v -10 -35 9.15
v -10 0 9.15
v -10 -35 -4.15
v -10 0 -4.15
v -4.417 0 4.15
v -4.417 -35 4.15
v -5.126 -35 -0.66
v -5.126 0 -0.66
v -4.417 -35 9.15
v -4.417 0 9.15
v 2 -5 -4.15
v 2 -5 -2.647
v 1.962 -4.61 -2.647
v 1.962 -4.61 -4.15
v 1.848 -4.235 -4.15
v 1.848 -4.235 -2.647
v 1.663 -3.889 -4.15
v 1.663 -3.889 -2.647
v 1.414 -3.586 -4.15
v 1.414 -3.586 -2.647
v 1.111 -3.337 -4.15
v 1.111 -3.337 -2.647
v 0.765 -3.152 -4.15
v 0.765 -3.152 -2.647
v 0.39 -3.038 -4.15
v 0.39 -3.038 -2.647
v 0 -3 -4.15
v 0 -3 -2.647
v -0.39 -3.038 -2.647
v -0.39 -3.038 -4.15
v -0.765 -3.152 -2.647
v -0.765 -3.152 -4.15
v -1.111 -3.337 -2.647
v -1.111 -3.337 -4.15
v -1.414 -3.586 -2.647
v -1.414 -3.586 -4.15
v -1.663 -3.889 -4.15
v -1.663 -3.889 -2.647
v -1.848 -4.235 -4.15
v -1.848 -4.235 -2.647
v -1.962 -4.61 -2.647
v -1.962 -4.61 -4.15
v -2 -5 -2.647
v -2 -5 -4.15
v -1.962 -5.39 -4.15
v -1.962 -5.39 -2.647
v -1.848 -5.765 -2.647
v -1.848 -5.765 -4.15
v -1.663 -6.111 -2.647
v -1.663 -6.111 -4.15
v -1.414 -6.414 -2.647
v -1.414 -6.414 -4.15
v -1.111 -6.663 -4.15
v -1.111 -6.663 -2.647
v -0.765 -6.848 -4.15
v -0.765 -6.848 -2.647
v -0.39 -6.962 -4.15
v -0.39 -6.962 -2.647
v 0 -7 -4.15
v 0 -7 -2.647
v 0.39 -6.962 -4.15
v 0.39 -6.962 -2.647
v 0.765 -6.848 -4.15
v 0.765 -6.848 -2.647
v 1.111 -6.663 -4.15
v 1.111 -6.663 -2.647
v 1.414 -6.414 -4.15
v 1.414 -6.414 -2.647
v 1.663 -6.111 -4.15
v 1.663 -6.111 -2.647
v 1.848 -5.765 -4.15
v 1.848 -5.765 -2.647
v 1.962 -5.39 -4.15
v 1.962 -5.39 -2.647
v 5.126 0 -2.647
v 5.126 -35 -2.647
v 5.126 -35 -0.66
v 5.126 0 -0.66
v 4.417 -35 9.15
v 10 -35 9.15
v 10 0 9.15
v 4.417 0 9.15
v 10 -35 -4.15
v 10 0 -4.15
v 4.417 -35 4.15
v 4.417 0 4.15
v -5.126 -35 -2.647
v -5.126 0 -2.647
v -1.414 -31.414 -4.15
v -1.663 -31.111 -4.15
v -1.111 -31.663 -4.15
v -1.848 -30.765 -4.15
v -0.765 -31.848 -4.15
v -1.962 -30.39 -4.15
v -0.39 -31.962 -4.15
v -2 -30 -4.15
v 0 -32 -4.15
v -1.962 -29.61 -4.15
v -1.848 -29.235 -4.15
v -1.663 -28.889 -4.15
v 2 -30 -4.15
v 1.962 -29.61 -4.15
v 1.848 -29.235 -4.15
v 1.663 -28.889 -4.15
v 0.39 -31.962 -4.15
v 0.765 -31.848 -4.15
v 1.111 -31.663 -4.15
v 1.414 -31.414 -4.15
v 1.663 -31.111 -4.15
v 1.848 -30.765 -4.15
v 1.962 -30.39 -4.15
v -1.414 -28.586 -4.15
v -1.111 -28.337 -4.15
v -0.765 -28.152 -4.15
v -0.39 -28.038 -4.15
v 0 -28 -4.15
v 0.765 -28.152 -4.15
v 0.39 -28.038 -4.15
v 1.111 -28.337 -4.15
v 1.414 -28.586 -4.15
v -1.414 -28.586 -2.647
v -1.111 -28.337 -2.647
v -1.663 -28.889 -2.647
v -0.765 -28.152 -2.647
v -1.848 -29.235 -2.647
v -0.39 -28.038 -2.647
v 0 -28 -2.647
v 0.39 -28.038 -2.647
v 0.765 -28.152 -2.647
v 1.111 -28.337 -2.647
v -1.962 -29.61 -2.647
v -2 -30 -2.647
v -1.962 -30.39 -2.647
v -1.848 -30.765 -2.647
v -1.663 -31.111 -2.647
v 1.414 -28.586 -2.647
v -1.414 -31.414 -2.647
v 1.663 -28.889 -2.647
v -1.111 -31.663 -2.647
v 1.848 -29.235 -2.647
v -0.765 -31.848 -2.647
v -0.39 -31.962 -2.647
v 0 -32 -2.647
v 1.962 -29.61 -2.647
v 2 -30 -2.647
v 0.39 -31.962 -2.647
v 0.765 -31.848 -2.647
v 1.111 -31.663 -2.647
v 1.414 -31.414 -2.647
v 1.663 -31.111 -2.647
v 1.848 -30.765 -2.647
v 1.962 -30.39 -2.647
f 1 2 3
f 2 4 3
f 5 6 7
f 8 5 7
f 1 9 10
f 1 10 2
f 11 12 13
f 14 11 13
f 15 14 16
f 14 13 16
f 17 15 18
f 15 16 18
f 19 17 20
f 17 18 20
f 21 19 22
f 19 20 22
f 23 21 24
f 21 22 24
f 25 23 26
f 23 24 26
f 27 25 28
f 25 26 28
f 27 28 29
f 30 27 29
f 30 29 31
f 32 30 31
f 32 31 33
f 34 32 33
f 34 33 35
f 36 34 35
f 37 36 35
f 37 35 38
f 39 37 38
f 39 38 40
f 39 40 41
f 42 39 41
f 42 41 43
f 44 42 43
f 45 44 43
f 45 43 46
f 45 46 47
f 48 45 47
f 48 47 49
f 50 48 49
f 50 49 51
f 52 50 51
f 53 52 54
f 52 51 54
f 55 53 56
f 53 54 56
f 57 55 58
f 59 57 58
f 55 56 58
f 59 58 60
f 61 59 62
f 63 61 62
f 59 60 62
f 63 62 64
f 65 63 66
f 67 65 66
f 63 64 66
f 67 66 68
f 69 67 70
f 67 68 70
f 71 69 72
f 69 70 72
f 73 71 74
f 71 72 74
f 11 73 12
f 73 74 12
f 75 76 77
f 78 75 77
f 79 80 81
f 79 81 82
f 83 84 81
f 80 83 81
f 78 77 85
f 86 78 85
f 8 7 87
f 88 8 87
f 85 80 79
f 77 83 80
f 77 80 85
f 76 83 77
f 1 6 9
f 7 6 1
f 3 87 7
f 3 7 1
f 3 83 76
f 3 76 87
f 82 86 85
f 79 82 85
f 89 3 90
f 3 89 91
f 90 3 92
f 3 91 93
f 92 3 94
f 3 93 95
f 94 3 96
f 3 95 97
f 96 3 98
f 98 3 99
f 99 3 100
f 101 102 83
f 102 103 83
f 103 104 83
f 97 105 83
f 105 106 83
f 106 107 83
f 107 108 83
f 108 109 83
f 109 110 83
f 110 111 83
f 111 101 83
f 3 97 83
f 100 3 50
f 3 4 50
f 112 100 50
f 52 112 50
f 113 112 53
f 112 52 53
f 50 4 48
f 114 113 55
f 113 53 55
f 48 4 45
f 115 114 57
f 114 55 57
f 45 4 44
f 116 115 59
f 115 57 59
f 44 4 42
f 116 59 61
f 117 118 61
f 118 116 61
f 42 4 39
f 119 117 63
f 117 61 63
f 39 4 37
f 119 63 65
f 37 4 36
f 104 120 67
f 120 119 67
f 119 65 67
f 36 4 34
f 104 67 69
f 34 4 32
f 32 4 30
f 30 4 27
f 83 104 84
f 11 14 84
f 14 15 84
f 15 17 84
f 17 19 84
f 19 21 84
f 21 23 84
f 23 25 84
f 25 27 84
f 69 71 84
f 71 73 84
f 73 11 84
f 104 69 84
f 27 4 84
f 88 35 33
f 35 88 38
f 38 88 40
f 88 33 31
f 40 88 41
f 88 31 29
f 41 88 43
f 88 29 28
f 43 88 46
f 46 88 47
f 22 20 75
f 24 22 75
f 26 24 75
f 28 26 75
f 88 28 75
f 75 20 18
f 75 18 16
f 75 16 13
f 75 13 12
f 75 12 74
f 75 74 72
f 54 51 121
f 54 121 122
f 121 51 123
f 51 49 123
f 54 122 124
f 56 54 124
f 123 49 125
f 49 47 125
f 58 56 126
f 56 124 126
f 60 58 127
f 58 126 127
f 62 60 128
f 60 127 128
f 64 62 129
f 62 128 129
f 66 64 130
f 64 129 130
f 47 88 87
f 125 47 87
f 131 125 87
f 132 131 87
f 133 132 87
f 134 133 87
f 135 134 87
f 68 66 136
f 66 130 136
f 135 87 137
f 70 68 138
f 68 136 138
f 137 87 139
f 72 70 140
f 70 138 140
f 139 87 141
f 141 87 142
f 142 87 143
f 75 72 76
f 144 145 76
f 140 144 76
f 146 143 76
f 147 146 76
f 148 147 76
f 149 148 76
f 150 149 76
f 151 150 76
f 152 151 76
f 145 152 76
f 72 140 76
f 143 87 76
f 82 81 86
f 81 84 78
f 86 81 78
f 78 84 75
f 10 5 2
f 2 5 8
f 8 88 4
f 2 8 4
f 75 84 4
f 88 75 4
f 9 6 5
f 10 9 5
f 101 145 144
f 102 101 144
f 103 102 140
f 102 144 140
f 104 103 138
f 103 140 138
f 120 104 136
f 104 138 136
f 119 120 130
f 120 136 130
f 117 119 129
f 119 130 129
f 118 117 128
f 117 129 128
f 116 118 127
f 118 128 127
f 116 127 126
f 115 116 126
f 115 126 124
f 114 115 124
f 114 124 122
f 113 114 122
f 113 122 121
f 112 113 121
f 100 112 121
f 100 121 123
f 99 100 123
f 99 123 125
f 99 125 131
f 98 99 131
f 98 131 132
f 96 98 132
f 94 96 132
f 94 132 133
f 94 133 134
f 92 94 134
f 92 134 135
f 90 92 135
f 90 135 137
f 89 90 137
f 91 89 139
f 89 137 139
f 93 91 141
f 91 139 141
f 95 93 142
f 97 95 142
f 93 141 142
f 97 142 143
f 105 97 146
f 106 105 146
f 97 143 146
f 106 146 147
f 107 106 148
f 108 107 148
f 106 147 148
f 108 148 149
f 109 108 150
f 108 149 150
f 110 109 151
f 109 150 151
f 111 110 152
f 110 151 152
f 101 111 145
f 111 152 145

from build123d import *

# Parameters (mm, degrees)
F1_DEPTH = 35
F2_R     = 2
F3_DEPTH = 8.301
F8_DEPTH = 35.001
F9_DEPTH = 5


# Not quite as in the source:
# - a feature names something its author has since deleted; it is built from what else it names


with BuildPart() as f1:
    # F0 (on Front) → F1 (new body)
    with BuildSketch(Plane.XZ):
        Polygon((10, 4.15), (4.15, 4.15), (-4.15, 4.15), (-10, 4.15), (-10, -4.15), (-4.15, -4.15), (4.15, -4.15), (10, -4.15), align=None)
        with BuildLine():
            ThreePointArc((5.15, -1.65), (4.8571067812, -2.3571067812), (4.15, -2.65))
            Line((4.15, -2.65), (-4.15, -2.65))
            ThreePointArc((-4.15, -2.65), (-4.8571067812, -2.3571067812), (-5.15, -1.65))
            Line((-5.15, -1.65), (-5.15, 1.65))
            ThreePointArc((-5.15, 1.65), (-4.8571067812, 2.3571067812), (-4.15, 2.65))
            Line((-4.15, 2.65), (4.15, 2.65))
            ThreePointArc((4.15, 2.65), (4.8571067812, 2.3571067812), (5.15, 1.65))
            Line((5.15, 1.65), (5.15, -1.65))
        make_face(mode=Mode.SUBTRACT)
        with BuildLine():
            Line((-4.15, -2.65), (4.15, -2.65))
            ThreePointArc((4.15, -2.65), (4.8571067812, -2.3571067812), (5.15, -1.65))
            Line((5.15, -1.65), (5.15, 1.65))
            ThreePointArc((5.15, 1.65), (4.8571067812, 2.3571067812), (4.15, 2.65))
            Line((4.15, 2.65), (-4.15, 2.65))
            ThreePointArc((-4.15, 2.65), (-4.8571067812, 2.3571067812), (-5.15, 1.65))
            Line((-5.15, 1.65), (-5.15, -1.65))
            ThreePointArc((-5.15, -1.65), (-4.8571067812, -2.3571067812), (-4.15, -2.65))
        make_face()
    extrude(amount=F1_DEPTH)

    # F2 (on face) → F3 (cut, through all)
    with BuildSketch(Plane.XY.offset(4.15)):
        with Locations((0, -5)):
            Circle(F2_R)
        with Locations((0, -30)):
            Circle(F2_R)
    extrude(amount=-F3_DEPTH, mode=Mode.SUBTRACT)

    # F7 (on offset) → F8 (cut, through all)
    with BuildSketch(Plane.XZ.offset(35)):
        Polygon((-5.1262229681, -2.646596171), (0, -2.646596171), (5.1262229681, -2.646596171), (5.1262229681, -0.6600963534), (4.3867812492, 4.353403829), (0, 4.353403829), (-4.3867812492, 4.353403829), (-5.1262229681, -0.6600963534), align=None)
    extrude(amount=-F8_DEPTH, mode=Mode.SUBTRACT)

    # F9 (add): faces of the model
    f9_faces = [f1.faces().sort_by_distance(p)[0] for p in [
        (-7.2083906517, -17.5, 4.15),
        (7.2083906517, -17.5, 4.15),
    ]]
    extrude(f9_faces, amount=F9_DEPTH)


solid = f1.part
